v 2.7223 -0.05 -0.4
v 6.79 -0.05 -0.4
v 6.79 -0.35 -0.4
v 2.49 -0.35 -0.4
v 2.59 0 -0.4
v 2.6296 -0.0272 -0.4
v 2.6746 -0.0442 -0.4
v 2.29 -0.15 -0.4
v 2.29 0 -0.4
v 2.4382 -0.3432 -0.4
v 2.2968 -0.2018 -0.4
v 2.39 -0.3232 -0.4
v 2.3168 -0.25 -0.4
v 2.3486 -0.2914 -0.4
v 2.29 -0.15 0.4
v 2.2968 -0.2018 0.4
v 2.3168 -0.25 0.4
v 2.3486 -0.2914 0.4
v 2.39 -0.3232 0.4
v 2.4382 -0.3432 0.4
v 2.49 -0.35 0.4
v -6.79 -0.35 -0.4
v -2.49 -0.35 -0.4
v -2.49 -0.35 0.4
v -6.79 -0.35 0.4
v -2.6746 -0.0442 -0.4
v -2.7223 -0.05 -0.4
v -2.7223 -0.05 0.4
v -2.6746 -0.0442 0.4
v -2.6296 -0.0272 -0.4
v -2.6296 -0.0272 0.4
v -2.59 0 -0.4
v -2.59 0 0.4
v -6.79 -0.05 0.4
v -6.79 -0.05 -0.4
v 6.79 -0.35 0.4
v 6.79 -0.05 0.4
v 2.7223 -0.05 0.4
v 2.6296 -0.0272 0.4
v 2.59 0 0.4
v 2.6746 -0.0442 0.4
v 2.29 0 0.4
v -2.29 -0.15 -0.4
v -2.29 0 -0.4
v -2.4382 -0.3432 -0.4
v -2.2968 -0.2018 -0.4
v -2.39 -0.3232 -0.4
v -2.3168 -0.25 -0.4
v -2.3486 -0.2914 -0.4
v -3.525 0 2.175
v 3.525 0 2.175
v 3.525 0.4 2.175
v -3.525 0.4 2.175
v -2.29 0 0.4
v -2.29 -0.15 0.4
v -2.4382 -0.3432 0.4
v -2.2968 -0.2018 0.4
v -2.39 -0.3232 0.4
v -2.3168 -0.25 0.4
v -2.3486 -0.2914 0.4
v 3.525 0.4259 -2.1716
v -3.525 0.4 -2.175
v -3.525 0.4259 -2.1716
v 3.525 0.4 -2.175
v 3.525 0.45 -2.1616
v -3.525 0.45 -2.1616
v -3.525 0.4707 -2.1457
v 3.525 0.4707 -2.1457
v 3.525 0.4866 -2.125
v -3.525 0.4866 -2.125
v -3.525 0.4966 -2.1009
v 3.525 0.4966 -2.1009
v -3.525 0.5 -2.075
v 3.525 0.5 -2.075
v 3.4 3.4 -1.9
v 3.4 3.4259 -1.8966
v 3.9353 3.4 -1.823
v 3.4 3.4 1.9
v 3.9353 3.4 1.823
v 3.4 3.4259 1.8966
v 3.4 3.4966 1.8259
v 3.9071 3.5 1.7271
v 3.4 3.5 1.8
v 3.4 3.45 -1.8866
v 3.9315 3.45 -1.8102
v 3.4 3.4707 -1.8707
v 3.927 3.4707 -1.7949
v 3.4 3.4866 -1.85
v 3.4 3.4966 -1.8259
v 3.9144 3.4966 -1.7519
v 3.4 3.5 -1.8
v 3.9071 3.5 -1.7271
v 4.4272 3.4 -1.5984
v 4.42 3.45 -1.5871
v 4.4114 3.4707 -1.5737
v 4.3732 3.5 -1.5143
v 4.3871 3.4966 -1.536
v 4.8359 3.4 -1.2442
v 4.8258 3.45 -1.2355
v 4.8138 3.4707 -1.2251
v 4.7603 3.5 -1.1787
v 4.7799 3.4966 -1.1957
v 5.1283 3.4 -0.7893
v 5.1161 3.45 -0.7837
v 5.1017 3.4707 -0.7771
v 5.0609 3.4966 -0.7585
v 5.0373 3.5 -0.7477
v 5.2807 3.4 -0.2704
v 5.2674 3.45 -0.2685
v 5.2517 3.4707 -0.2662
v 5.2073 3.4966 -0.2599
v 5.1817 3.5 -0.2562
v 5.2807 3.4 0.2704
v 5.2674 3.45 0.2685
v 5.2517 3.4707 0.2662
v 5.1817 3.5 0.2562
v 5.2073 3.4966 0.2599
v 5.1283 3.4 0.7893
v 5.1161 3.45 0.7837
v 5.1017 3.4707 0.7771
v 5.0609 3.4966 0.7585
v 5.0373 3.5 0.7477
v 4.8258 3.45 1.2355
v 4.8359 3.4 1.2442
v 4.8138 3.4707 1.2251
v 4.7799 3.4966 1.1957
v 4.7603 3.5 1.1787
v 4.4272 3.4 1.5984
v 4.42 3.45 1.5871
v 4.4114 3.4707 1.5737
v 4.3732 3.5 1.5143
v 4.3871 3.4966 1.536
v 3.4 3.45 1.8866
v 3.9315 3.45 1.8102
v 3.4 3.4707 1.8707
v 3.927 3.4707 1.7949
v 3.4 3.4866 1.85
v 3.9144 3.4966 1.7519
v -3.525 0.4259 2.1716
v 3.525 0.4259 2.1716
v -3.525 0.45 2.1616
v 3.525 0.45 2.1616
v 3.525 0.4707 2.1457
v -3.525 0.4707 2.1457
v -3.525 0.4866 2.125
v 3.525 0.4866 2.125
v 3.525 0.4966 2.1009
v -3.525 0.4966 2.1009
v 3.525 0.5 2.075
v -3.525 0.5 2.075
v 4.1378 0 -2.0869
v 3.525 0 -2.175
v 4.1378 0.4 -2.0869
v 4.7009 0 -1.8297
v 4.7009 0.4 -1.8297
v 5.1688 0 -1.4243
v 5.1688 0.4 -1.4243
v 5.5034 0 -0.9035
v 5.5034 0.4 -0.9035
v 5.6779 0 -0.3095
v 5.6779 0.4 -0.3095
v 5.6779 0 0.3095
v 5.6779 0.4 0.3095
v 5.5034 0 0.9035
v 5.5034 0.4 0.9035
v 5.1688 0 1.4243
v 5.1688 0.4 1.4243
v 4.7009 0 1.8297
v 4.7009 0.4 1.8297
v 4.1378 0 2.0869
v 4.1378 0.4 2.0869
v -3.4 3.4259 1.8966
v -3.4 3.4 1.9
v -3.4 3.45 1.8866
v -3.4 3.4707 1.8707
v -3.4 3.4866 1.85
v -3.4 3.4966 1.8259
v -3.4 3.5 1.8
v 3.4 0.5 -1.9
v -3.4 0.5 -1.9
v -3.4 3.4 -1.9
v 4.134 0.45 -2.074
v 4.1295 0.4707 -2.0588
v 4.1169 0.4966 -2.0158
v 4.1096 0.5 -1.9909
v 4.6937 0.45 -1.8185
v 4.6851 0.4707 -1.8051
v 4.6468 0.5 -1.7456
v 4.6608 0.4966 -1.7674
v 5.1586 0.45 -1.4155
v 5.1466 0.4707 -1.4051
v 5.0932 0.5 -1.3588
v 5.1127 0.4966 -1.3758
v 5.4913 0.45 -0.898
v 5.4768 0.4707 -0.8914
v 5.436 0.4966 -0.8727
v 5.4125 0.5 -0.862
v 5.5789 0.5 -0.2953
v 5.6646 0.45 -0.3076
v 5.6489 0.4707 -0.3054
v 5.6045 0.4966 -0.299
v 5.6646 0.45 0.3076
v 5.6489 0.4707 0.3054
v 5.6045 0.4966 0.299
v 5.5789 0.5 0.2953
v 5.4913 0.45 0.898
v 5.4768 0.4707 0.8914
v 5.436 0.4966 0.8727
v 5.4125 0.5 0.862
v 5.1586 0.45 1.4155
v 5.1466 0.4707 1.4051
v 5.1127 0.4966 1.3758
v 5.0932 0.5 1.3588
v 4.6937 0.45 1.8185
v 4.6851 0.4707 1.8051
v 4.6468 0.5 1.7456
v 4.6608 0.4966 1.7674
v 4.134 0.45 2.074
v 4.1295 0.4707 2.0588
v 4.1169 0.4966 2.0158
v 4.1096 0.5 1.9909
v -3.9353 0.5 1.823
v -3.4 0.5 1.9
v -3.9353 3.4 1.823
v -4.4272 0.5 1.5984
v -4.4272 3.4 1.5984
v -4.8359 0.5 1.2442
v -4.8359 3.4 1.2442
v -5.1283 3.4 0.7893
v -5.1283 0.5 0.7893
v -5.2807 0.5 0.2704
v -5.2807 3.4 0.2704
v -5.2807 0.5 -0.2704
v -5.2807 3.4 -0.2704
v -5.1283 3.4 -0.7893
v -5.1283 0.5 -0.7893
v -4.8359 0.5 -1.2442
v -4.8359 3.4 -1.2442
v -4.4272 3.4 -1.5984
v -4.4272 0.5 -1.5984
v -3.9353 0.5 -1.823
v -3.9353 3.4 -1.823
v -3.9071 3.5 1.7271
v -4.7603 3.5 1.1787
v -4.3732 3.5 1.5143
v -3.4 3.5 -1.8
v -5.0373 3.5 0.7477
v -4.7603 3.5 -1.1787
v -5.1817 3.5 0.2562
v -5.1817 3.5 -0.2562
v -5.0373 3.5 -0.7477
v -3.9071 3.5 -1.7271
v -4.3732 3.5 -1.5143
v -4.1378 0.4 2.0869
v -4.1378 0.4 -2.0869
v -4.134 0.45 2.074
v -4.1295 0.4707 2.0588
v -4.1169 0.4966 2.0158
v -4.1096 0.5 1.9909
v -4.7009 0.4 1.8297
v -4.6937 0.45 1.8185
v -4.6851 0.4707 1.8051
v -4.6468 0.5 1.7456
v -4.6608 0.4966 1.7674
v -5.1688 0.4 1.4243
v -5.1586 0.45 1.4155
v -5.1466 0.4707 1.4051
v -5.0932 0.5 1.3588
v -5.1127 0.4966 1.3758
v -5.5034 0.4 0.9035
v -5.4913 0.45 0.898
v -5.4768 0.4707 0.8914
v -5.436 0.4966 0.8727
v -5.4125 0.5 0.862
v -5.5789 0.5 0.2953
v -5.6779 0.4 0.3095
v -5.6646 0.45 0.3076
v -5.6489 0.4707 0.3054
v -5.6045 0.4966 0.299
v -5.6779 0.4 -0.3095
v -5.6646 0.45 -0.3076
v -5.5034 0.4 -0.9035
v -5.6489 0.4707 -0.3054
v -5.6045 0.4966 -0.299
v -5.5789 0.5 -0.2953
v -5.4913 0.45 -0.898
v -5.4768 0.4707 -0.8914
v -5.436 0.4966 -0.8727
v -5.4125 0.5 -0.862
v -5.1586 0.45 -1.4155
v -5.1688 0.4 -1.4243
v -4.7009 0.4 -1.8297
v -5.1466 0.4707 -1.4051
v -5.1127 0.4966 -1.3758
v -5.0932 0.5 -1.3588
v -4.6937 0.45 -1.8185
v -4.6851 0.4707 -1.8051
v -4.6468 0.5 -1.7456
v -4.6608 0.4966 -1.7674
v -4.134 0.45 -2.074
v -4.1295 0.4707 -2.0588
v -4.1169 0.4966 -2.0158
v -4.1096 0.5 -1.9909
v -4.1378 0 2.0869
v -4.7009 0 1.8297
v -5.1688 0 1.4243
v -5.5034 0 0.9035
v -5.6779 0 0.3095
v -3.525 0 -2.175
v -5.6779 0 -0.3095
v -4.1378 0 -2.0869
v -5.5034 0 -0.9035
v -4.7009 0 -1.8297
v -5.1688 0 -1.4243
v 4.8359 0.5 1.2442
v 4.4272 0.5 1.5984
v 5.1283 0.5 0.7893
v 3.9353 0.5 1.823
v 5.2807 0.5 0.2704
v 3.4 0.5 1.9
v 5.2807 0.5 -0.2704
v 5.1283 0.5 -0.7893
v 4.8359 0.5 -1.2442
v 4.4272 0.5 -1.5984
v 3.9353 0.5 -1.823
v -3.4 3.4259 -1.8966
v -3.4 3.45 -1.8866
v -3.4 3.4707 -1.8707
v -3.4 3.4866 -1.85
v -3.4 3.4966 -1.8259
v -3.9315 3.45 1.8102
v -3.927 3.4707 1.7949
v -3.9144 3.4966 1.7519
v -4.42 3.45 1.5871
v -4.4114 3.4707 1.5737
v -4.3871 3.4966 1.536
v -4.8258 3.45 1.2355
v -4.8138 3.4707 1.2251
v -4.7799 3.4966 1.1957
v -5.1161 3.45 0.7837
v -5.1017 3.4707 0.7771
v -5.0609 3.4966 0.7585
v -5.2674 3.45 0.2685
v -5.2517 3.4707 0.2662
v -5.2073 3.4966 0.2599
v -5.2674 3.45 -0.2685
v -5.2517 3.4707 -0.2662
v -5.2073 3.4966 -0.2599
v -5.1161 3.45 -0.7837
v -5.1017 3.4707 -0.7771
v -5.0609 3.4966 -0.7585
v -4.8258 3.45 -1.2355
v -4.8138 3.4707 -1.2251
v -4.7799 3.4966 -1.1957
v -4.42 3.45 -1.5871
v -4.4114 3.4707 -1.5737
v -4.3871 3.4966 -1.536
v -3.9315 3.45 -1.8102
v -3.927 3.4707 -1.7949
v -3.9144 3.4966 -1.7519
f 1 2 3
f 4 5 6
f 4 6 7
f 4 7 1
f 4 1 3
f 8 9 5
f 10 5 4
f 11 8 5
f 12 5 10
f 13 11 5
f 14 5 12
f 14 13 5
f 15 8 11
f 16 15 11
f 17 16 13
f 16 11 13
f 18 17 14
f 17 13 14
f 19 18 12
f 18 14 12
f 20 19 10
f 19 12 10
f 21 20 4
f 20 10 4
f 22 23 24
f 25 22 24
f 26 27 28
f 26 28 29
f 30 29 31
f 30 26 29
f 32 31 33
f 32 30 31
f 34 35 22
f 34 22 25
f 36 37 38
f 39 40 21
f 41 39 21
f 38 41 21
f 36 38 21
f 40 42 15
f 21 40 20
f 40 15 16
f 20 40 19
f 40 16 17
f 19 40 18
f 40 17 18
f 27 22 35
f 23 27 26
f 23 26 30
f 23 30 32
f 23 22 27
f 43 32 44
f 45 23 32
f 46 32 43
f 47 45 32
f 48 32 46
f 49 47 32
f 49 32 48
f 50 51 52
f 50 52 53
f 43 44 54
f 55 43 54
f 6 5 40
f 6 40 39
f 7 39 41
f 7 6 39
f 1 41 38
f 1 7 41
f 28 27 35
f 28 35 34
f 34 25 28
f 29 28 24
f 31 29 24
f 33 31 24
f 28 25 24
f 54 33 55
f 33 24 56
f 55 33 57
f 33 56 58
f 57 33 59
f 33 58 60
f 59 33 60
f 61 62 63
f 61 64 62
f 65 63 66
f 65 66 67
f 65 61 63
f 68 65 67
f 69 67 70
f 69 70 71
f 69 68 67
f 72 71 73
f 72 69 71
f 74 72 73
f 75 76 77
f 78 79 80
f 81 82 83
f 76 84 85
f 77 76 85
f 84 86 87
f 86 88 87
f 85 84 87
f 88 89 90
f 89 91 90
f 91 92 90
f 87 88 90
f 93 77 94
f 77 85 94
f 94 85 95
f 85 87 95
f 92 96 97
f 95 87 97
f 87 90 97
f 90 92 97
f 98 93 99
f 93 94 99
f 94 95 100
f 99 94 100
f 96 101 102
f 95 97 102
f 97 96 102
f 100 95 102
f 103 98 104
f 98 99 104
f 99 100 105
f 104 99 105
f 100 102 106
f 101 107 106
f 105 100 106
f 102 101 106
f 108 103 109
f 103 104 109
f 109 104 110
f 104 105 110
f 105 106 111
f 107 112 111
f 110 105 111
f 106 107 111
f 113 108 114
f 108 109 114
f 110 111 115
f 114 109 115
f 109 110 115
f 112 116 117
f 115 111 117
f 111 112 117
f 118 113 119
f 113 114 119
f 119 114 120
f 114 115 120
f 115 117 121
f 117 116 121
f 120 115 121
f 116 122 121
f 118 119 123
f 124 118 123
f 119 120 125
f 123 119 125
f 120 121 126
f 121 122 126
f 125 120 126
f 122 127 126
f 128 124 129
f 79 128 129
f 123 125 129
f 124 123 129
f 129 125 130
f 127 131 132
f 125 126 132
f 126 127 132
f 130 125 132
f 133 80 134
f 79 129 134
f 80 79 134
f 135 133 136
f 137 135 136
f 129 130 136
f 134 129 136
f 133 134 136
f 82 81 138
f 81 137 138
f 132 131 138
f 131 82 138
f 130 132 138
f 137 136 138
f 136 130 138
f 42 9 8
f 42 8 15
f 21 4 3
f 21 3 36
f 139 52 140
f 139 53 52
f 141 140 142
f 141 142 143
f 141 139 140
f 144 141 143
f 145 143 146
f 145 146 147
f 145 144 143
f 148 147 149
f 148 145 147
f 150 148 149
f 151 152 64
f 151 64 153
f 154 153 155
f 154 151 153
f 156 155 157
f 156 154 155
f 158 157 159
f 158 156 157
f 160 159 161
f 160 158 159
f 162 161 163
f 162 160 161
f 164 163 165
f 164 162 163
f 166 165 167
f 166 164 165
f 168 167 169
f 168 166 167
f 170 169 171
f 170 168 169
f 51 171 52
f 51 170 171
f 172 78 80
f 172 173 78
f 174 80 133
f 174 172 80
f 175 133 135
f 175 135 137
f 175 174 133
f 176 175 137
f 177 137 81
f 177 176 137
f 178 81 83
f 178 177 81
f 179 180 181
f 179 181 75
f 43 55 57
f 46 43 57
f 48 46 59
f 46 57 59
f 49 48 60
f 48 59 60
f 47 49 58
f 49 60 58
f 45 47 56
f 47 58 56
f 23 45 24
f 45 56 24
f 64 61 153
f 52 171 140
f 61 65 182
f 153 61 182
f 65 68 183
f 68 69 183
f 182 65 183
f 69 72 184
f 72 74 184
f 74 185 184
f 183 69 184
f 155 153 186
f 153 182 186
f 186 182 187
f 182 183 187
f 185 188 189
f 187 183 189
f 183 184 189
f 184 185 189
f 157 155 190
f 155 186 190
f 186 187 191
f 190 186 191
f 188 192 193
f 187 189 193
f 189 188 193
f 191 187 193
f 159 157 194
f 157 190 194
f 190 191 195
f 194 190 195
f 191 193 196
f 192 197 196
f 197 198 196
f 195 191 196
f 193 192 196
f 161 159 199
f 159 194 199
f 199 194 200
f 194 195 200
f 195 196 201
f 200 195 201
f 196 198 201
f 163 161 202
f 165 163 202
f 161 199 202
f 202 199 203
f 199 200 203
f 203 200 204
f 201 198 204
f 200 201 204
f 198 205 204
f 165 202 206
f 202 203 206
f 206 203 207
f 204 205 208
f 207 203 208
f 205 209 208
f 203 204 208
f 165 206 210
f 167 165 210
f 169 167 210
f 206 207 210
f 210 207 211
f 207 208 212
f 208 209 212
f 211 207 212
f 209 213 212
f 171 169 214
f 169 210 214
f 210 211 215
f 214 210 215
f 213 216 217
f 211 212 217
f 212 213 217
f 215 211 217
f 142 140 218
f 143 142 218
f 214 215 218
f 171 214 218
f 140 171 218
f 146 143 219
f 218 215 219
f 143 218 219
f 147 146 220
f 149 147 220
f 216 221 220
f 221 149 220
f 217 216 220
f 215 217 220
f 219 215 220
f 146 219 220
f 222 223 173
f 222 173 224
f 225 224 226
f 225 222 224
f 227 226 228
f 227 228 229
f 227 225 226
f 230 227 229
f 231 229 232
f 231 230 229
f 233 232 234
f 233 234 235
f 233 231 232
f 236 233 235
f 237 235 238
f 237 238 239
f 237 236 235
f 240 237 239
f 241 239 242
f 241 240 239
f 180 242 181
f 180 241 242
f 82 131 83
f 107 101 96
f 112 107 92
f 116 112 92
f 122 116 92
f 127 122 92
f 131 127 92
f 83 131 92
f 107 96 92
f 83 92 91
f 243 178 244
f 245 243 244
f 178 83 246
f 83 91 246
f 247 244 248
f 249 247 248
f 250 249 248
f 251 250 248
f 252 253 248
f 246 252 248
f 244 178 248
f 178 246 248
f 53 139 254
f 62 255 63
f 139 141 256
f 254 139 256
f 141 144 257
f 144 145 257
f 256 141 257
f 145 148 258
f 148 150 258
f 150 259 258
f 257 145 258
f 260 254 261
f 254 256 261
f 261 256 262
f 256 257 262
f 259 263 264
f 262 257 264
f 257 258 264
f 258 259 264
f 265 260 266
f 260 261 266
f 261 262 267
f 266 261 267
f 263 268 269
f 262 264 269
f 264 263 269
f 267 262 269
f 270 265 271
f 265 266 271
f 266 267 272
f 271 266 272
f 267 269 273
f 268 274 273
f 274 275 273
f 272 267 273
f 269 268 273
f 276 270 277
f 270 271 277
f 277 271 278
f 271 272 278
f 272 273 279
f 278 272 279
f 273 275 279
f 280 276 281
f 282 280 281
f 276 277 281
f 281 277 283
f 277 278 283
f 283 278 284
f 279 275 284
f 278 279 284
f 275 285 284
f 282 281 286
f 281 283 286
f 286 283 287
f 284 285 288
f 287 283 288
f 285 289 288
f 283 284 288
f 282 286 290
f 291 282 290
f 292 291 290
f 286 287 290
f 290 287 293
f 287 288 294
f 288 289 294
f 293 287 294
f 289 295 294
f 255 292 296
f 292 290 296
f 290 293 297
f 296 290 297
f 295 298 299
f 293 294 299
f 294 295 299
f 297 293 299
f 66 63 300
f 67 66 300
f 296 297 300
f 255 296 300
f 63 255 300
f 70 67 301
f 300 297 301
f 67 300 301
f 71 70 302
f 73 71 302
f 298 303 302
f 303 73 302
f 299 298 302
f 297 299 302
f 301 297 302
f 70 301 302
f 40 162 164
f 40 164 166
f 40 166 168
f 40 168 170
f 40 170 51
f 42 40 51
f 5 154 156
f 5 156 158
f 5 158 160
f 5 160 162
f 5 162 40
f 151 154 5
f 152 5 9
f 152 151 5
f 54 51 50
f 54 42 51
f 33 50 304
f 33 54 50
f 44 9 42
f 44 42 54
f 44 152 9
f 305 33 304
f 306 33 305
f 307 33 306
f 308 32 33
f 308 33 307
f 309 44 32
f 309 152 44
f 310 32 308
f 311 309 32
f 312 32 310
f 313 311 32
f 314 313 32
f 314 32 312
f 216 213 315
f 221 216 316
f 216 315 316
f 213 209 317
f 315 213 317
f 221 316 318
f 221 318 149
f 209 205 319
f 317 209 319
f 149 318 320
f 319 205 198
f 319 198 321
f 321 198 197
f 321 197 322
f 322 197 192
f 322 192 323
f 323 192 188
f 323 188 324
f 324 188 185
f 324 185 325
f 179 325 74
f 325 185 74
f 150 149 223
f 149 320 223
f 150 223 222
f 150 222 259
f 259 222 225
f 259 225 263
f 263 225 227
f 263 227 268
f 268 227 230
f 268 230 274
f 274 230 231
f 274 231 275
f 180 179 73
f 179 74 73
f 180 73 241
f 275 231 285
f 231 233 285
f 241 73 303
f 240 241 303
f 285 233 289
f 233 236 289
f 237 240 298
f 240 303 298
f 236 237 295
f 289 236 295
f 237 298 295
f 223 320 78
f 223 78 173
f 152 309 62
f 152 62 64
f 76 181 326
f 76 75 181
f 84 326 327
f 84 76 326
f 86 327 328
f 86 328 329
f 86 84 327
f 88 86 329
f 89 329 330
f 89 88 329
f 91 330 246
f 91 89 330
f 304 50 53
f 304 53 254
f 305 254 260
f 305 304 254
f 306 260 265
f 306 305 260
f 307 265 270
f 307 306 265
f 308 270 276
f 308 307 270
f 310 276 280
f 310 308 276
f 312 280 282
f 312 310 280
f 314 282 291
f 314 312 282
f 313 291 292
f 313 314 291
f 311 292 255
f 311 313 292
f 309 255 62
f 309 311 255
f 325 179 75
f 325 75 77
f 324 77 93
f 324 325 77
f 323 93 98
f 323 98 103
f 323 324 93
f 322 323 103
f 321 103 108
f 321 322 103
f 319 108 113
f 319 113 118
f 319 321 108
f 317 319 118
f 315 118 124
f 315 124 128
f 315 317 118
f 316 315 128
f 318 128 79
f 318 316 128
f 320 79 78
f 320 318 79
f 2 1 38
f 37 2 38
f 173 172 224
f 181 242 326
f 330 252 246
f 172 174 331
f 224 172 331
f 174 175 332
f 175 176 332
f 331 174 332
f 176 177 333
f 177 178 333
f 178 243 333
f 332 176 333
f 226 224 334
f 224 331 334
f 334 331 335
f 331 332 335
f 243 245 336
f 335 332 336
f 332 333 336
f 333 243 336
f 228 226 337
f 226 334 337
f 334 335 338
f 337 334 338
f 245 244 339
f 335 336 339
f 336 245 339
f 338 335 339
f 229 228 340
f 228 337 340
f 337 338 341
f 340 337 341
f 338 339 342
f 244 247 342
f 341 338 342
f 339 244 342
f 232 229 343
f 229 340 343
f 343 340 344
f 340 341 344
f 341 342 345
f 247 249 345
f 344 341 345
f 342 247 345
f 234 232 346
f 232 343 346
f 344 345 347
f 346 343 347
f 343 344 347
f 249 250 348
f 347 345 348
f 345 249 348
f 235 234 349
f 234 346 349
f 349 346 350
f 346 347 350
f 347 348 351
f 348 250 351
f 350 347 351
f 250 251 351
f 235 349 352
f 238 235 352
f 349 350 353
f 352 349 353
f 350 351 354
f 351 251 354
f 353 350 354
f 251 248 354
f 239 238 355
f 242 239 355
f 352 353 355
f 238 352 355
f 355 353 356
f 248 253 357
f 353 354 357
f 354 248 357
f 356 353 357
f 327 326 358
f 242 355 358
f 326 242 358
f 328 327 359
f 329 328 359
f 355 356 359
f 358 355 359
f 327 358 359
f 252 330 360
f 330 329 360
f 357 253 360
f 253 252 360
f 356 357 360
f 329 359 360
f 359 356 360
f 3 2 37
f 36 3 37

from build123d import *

# Parameters (mm, degrees)
BOSS_EXTRUDE1_DEPTH = 0.5
FILLET1_R           = 0.1
BOSS_EXTRUDE2_DEPTH = 3
FILLET2_R           = 0.1
SKETCH4_W           = 0.3
SKETCH4_H           = 0.8
BOSS_EXTRUDE3_DEPTH = 0.35
SKETCH5_W           = 0.8
SKETCH5_H           = 0.3
BOSS_EXTRUDE4_DEPTH = 4.2
FILLET3_R           = 0.2


with BuildPart() as part:
    # Sketch1 → Boss-Extrude1 (new body)
    with BuildSketch(Plane(origin=(0, 0, 0), x_dir=(1, 0, 0), z_dir=(0, 1, 0))):
        with BuildLine():
            Line((-3.525, 2.175), (3.525, 2.175))
            ThreePointArc((3.525, 2.175), (5.7, 0), (3.525, -2.175))
            Line((3.525, -2.175), (-3.525, -2.175))
            ThreePointArc((-3.525, -2.175), (-5.7, 0), (-3.525, 2.175))
        make_face()
    extrude(amount=BOSS_EXTRUDE1_DEPTH)

    # Fillet1
    fillet1_edges = [part.edges().sort_by_distance(p)[0] for p in [
        (5.7, 0.5, 0),
        (0, 0.5, -2.175),
        (-5.7, 0.5, 0),
        (0, 0.5, 2.175),
    ]]
    fillet(fillet1_edges, radius=FILLET1_R)

    # Sketch2 → Boss-Extrude2 (add)
    with BuildSketch(Plane(origin=(0, 0.5, 0), x_dir=(1, 0, 0), z_dir=(0, 1, 0))):
        with BuildLine():
            Line((-3.4, 1.9), (3.4, 1.9))
            ThreePointArc((3.4, 1.9), (5.3, 0), (3.4, -1.9))
            Line((3.4, -1.9), (-3.4, -1.9))
            ThreePointArc((-3.4, -1.9), (-5.3, 0), (-3.4, 1.9))
        make_face()
    extrude(amount=BOSS_EXTRUDE2_DEPTH)

    # Fillet2
    fillet2_edges = [part.edges().sort_by_distance(p)[0] for p in [
        (-5.3, 3.5, 0),
        (0, 3.5, 1.9),
        (5.3, 3.5, 0),
        (0, 3.5, -1.9),
    ]]
    fillet(fillet2_edges, radius=FILLET2_R)

    # Sketch4 → Boss-Extrude3 (add)
    with BuildSketch(Plane.XZ):
        with Locations((2.44, 0)):
            Rectangle(SKETCH4_W, SKETCH4_H)
        with Locations((-2.44, 0)):
            Rectangle(SKETCH4_W, SKETCH4_H)
    extrude(amount=BOSS_EXTRUDE3_DEPTH)

    # Sketch5 → Boss-Extrude4 (add)
    with BuildSketch(Plane.ZY.offset(2.59)):
        with Locations((0, -0.2)):
            Rectangle(SKETCH5_W, SKETCH5_H)
    boss_extrude4 = extrude(amount=BOSS_EXTRUDE4_DEPTH)

    # Mirror1: Boss-Extrude4 across plane
    add(boss_extrude4.mirror(Plane(origin=(0, 0, 0), x_dir=(0, 0, 1), z_dir=(1, 0, 0))))

    # Fillet3
    # the kernel refuses this fillet: 0.2 mm, written as the material it adds along each edge
    with BuildSketch(Plane(origin=(-2.59, -0.05, -0.4), x_dir=(-1, 0, 0), z_dir=(0, 0, 1))) as fillet3_piece_1:
        with BuildLine():
            CenterArc((0.132287566, -0.2), FILLET3_R, 90, 41.409622109)
            Line((0, -0.05), (0, 0))
            Line((0, 0), (0.132287566, 0))
        make_face()
    extrude(amount=0.8)
    with BuildSketch(Plane(origin=(2.59, -0.05, -0.4), x_dir=(0, 1, 0), z_dir=(0, 0, 1))) as fillet3_piece_2:
        with BuildLine():
            CenterArc((0.2, -0.132287566), FILLET3_R, 138.590377891, 41.409622109)
            Line((0, -0.132287566), (0, 0))
            Line((0, 0), (0.05, 0))
        make_face()
    extrude(amount=0.8)
    # the kernel refuses this fillet: 0.2 mm, written as the material it takes off along each edge
    with BuildSketch(Plane(origin=(2.29, -0.35, -0.9), x_dir=(0, 1, 0), z_dir=(0, 0, 1)), Plane(origin=(-2.29, -0.35, 0.9), x_dir=(0, 1, 0), z_dir=(0, 0, -1))) as fillet3_2_piece_1:
        with BuildLine():
            CenterArc((FILLET3_R, -FILLET3_R), FILLET3_R, 90, 90)
            Line((0, -FILLET3_R), (0, 0))
            Line((0, 0), (FILLET3_R, 0))
        make_face()
    extrude(amount=1.8, mode=Mode.SUBTRACT)


solid = part.part
